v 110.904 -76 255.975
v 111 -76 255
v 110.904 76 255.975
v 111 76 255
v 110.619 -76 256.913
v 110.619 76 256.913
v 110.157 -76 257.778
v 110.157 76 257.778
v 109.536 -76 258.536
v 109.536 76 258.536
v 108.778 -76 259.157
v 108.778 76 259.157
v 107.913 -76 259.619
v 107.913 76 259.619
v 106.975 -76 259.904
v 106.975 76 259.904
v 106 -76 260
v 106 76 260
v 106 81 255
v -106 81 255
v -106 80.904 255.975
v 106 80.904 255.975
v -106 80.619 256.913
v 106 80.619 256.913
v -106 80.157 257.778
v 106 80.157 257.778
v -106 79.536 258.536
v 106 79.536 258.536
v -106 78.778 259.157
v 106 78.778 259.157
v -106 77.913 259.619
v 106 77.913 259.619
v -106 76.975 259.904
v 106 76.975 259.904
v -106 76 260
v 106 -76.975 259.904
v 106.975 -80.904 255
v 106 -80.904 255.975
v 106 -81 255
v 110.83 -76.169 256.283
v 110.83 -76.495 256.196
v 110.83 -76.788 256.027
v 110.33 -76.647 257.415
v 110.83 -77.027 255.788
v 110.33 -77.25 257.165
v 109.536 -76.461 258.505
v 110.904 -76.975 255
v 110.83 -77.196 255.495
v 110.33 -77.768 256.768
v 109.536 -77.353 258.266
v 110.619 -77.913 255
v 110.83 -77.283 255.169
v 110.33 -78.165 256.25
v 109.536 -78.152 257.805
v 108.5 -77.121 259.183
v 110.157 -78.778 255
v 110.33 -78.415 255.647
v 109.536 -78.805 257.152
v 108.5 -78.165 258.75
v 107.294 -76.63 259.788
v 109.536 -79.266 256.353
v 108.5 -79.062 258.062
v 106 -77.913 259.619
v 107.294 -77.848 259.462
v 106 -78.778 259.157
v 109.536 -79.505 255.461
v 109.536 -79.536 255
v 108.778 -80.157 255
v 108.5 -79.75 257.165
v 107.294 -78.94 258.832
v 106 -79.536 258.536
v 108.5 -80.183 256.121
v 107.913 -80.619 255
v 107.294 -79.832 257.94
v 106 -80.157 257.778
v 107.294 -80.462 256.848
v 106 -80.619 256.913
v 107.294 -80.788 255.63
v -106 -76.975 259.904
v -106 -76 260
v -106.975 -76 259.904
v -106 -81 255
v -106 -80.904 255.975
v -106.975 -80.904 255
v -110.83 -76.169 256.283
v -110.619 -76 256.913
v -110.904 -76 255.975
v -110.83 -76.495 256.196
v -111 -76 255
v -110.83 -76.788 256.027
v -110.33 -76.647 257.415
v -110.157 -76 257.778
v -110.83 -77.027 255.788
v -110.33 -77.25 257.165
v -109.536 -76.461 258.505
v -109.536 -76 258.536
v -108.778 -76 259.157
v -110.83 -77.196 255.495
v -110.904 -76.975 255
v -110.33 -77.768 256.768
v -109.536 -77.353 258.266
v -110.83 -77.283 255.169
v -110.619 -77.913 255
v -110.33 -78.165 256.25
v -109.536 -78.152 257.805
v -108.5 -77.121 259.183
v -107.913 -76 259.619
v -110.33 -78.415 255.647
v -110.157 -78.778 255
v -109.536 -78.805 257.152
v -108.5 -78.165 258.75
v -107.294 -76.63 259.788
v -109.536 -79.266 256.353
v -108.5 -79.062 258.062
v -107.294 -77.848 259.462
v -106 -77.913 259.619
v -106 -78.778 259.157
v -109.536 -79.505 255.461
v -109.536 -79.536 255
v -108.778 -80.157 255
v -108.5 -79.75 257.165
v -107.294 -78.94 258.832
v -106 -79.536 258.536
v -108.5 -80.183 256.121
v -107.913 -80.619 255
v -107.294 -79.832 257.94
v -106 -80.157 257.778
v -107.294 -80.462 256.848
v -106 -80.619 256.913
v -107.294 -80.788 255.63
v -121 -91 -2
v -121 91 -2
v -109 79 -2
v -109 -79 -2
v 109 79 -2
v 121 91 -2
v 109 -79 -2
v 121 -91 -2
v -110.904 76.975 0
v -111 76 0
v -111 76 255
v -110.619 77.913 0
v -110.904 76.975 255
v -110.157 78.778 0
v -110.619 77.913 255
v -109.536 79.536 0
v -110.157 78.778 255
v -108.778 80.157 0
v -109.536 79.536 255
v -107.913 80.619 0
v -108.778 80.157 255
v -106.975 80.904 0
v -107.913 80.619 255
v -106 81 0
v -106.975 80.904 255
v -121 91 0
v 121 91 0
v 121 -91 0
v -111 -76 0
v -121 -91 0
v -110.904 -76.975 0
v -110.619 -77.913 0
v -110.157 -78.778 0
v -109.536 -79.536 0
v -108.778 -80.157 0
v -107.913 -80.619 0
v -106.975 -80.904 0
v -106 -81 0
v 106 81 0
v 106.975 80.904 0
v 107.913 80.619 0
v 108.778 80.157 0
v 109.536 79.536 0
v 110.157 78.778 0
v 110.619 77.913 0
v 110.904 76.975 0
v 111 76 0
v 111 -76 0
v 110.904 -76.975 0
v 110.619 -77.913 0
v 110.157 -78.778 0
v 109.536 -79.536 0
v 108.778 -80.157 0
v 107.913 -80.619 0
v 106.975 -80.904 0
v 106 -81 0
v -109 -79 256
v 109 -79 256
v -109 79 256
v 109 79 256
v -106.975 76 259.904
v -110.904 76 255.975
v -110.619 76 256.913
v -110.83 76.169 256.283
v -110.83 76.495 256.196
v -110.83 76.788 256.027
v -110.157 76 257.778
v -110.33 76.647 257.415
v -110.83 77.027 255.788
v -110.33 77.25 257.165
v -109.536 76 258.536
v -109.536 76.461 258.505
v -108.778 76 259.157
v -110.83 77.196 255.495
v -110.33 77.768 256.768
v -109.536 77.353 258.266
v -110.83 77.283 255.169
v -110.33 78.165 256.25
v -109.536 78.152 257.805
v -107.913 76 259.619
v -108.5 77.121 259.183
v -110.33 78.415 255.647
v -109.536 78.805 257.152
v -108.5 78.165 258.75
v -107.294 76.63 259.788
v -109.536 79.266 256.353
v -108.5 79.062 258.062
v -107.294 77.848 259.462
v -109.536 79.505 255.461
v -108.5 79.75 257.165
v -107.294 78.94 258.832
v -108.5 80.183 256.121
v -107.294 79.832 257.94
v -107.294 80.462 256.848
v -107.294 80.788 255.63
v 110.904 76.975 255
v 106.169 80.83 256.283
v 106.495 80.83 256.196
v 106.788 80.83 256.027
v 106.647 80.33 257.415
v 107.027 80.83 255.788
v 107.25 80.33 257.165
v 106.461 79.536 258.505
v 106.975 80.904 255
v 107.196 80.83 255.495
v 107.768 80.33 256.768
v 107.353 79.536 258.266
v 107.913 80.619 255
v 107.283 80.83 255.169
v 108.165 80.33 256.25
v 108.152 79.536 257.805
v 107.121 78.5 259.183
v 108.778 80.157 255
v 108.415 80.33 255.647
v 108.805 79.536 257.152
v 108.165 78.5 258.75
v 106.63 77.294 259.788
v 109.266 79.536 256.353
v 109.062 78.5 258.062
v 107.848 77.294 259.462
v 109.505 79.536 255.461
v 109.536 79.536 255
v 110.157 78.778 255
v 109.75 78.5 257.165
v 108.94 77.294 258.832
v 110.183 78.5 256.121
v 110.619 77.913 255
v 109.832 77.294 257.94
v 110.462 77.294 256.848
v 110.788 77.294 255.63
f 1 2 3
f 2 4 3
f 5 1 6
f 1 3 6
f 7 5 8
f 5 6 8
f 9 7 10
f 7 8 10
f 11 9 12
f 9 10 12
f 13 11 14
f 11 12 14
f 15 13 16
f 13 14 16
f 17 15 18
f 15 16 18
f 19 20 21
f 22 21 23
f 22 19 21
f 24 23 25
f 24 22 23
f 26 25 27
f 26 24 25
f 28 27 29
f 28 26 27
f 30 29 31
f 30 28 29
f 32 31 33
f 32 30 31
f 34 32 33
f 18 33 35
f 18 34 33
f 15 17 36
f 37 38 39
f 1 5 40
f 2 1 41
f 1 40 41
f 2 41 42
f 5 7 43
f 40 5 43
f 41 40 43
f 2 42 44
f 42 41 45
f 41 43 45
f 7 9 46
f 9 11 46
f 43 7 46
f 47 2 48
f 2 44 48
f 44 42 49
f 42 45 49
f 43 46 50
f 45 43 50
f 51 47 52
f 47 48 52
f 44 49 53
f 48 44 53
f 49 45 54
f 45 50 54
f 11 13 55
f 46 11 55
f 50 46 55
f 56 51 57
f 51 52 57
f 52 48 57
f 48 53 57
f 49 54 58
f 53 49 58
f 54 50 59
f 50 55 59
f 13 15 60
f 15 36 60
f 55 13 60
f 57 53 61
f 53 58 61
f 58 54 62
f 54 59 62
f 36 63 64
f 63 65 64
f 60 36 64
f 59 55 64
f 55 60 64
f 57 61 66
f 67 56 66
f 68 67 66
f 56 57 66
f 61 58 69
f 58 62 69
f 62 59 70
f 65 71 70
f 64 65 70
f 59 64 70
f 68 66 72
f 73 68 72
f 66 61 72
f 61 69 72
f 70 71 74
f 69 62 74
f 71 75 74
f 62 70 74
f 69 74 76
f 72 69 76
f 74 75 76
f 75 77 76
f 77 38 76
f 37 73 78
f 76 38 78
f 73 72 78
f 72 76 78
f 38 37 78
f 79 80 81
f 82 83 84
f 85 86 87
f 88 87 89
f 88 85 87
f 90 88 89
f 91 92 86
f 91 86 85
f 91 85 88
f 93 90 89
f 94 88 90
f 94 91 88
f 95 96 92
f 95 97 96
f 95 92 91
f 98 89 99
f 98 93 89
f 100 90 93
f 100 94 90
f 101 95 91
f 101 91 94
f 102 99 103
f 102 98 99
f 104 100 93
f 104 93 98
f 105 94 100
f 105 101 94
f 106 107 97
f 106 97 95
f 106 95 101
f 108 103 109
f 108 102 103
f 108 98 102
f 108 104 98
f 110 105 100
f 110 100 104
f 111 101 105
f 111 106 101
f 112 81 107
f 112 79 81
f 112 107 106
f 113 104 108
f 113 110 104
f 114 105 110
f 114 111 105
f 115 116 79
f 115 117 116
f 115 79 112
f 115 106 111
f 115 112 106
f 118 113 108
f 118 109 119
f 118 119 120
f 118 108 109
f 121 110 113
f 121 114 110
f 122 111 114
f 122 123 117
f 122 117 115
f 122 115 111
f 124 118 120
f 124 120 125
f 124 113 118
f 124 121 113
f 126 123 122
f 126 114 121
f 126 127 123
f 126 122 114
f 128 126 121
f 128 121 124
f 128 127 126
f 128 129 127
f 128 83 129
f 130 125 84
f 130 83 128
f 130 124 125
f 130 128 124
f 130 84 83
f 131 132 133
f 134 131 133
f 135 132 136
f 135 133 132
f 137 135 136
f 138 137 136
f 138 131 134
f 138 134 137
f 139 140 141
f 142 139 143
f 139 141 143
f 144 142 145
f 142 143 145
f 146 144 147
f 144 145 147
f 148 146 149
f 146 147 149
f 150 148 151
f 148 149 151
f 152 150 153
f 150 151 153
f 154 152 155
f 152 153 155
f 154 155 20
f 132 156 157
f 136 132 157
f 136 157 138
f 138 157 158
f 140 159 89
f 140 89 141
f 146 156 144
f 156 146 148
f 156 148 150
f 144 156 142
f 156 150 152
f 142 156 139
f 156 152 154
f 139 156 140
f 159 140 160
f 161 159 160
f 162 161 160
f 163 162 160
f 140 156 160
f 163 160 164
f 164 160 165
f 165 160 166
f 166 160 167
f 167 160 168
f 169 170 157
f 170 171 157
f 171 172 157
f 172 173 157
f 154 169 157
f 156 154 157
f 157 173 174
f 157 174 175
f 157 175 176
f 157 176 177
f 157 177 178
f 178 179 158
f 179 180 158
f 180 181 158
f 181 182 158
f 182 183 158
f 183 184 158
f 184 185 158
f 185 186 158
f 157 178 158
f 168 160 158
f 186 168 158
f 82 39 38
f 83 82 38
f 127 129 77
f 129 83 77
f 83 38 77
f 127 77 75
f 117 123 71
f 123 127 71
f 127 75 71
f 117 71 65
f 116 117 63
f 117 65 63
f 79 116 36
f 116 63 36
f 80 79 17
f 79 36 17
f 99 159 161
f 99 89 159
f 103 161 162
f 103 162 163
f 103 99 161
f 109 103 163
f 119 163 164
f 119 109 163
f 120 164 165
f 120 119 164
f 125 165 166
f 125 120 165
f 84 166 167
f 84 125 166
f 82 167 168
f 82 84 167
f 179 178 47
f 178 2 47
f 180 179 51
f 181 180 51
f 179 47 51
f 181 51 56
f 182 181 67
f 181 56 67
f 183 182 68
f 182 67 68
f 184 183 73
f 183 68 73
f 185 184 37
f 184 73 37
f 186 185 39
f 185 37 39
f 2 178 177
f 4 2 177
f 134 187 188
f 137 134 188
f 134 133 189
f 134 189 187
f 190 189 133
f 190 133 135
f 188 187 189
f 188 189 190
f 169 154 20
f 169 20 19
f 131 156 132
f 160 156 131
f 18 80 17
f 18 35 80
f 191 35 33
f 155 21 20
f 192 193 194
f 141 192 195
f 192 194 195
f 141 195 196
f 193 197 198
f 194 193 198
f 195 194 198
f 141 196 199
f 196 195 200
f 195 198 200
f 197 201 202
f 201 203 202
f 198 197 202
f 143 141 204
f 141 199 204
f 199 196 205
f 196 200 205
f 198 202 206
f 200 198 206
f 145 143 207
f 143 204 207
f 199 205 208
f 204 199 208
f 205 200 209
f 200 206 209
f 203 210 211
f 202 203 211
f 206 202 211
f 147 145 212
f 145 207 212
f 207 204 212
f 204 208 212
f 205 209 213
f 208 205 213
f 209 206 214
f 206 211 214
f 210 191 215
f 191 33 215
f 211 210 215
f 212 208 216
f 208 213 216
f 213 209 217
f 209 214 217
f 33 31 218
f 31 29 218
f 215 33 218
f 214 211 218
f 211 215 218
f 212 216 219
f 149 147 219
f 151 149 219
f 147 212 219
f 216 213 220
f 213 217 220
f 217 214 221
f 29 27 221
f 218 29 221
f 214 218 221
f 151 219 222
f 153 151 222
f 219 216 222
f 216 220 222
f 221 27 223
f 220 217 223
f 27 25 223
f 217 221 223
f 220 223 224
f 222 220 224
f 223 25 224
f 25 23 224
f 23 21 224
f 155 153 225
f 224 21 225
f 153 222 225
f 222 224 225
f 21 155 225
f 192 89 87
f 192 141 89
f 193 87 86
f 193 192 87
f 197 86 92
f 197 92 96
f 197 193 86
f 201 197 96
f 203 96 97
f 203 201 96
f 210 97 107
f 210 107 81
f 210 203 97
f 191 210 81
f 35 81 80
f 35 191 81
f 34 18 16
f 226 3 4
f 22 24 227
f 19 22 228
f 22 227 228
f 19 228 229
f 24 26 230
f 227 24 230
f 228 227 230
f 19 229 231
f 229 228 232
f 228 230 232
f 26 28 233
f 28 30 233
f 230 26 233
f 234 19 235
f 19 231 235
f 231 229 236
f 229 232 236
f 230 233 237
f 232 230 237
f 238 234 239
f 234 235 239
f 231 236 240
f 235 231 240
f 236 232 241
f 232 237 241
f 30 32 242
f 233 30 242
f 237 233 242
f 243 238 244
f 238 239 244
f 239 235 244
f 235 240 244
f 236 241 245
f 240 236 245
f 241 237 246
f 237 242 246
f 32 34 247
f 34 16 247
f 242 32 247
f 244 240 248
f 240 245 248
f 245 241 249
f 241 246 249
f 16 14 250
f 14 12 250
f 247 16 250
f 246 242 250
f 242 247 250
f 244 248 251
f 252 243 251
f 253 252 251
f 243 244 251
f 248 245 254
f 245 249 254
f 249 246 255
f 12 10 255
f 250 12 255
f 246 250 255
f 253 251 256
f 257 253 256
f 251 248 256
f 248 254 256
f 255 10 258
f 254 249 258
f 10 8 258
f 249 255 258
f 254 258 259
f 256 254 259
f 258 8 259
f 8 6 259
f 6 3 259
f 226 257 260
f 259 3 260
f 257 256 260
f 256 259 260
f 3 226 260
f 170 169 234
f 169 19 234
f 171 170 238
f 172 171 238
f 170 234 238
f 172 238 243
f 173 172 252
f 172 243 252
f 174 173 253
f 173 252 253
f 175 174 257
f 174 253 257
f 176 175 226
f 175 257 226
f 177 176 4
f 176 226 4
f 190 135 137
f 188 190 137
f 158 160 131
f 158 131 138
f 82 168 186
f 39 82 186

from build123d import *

# Parameters (mm, degrees)
F0_W     = 222
F0_H     = 162
F1_DEPTH = 260
F2_W     = 242
F2_H     = 182
F3_DEPTH = 2
F4_R     = 5
F5_R     = 4
F6_DEPTH = 2
F7_W     = 218
F7_H     = 158
F8_DEPTH = 258


with BuildPart() as f1:
    # F0 (on Top) → F1 (new body)
    with BuildSketch(Plane.XY):
        Rectangle(F0_W, F0_H)
    extrude(amount=F1_DEPTH)

    # F2 (on face) → F3 (join)
    with BuildSketch(Plane(origin=(0, 0, 0), x_dir=(1, 0, 0), z_dir=(0, 0, -1))):
        Rectangle(F2_W, F2_H)
    extrude(amount=F3_DEPTH)

    # F4
    f4_edges = [f1.edges().sort_by_distance(p)[0] for p in [
        (0, -81, 260),
        (111, 0, 260),
        (0, 81, 260),
        (-111, 0, 260),
        (111, -81, 130),
        (-111, -81, 130),
        (111, 81, 130),
        (-111, 81, 130),
    ]]
    fillet(f4_edges, radius=F4_R)

    # F7 (on face) → F8 (cut)
    with BuildSketch(Plane(origin=(0, 0, -2), x_dir=(1, 0, 0), z_dir=(0, 0, -1))):
        Rectangle(F7_W, F7_H)
    extrude(amount=-F8_DEPTH, mode=Mode.SUBTRACT)


with BuildPart() as f6:
    # F5 (on Right) → F6 (new body)
    with BuildSketch(Plane.YZ):
        with BuildLine():
            Line((-101, 20.151517), (-81, 20.151517))
            Line((-81, 20.151517), (-81, 40.151517))
            Line((-81, 40.151517), (-101, 40.151517))
            ThreePointArc((-101, 40.151517), (-111, 30.151517), (-101, 20.151517))
        make_face()
        with Locations((-101, 30.151517)):
            Circle(F5_R, mode=Mode.SUBTRACT)
    extrude(amount=F6_DEPTH)


solid = f1.part
